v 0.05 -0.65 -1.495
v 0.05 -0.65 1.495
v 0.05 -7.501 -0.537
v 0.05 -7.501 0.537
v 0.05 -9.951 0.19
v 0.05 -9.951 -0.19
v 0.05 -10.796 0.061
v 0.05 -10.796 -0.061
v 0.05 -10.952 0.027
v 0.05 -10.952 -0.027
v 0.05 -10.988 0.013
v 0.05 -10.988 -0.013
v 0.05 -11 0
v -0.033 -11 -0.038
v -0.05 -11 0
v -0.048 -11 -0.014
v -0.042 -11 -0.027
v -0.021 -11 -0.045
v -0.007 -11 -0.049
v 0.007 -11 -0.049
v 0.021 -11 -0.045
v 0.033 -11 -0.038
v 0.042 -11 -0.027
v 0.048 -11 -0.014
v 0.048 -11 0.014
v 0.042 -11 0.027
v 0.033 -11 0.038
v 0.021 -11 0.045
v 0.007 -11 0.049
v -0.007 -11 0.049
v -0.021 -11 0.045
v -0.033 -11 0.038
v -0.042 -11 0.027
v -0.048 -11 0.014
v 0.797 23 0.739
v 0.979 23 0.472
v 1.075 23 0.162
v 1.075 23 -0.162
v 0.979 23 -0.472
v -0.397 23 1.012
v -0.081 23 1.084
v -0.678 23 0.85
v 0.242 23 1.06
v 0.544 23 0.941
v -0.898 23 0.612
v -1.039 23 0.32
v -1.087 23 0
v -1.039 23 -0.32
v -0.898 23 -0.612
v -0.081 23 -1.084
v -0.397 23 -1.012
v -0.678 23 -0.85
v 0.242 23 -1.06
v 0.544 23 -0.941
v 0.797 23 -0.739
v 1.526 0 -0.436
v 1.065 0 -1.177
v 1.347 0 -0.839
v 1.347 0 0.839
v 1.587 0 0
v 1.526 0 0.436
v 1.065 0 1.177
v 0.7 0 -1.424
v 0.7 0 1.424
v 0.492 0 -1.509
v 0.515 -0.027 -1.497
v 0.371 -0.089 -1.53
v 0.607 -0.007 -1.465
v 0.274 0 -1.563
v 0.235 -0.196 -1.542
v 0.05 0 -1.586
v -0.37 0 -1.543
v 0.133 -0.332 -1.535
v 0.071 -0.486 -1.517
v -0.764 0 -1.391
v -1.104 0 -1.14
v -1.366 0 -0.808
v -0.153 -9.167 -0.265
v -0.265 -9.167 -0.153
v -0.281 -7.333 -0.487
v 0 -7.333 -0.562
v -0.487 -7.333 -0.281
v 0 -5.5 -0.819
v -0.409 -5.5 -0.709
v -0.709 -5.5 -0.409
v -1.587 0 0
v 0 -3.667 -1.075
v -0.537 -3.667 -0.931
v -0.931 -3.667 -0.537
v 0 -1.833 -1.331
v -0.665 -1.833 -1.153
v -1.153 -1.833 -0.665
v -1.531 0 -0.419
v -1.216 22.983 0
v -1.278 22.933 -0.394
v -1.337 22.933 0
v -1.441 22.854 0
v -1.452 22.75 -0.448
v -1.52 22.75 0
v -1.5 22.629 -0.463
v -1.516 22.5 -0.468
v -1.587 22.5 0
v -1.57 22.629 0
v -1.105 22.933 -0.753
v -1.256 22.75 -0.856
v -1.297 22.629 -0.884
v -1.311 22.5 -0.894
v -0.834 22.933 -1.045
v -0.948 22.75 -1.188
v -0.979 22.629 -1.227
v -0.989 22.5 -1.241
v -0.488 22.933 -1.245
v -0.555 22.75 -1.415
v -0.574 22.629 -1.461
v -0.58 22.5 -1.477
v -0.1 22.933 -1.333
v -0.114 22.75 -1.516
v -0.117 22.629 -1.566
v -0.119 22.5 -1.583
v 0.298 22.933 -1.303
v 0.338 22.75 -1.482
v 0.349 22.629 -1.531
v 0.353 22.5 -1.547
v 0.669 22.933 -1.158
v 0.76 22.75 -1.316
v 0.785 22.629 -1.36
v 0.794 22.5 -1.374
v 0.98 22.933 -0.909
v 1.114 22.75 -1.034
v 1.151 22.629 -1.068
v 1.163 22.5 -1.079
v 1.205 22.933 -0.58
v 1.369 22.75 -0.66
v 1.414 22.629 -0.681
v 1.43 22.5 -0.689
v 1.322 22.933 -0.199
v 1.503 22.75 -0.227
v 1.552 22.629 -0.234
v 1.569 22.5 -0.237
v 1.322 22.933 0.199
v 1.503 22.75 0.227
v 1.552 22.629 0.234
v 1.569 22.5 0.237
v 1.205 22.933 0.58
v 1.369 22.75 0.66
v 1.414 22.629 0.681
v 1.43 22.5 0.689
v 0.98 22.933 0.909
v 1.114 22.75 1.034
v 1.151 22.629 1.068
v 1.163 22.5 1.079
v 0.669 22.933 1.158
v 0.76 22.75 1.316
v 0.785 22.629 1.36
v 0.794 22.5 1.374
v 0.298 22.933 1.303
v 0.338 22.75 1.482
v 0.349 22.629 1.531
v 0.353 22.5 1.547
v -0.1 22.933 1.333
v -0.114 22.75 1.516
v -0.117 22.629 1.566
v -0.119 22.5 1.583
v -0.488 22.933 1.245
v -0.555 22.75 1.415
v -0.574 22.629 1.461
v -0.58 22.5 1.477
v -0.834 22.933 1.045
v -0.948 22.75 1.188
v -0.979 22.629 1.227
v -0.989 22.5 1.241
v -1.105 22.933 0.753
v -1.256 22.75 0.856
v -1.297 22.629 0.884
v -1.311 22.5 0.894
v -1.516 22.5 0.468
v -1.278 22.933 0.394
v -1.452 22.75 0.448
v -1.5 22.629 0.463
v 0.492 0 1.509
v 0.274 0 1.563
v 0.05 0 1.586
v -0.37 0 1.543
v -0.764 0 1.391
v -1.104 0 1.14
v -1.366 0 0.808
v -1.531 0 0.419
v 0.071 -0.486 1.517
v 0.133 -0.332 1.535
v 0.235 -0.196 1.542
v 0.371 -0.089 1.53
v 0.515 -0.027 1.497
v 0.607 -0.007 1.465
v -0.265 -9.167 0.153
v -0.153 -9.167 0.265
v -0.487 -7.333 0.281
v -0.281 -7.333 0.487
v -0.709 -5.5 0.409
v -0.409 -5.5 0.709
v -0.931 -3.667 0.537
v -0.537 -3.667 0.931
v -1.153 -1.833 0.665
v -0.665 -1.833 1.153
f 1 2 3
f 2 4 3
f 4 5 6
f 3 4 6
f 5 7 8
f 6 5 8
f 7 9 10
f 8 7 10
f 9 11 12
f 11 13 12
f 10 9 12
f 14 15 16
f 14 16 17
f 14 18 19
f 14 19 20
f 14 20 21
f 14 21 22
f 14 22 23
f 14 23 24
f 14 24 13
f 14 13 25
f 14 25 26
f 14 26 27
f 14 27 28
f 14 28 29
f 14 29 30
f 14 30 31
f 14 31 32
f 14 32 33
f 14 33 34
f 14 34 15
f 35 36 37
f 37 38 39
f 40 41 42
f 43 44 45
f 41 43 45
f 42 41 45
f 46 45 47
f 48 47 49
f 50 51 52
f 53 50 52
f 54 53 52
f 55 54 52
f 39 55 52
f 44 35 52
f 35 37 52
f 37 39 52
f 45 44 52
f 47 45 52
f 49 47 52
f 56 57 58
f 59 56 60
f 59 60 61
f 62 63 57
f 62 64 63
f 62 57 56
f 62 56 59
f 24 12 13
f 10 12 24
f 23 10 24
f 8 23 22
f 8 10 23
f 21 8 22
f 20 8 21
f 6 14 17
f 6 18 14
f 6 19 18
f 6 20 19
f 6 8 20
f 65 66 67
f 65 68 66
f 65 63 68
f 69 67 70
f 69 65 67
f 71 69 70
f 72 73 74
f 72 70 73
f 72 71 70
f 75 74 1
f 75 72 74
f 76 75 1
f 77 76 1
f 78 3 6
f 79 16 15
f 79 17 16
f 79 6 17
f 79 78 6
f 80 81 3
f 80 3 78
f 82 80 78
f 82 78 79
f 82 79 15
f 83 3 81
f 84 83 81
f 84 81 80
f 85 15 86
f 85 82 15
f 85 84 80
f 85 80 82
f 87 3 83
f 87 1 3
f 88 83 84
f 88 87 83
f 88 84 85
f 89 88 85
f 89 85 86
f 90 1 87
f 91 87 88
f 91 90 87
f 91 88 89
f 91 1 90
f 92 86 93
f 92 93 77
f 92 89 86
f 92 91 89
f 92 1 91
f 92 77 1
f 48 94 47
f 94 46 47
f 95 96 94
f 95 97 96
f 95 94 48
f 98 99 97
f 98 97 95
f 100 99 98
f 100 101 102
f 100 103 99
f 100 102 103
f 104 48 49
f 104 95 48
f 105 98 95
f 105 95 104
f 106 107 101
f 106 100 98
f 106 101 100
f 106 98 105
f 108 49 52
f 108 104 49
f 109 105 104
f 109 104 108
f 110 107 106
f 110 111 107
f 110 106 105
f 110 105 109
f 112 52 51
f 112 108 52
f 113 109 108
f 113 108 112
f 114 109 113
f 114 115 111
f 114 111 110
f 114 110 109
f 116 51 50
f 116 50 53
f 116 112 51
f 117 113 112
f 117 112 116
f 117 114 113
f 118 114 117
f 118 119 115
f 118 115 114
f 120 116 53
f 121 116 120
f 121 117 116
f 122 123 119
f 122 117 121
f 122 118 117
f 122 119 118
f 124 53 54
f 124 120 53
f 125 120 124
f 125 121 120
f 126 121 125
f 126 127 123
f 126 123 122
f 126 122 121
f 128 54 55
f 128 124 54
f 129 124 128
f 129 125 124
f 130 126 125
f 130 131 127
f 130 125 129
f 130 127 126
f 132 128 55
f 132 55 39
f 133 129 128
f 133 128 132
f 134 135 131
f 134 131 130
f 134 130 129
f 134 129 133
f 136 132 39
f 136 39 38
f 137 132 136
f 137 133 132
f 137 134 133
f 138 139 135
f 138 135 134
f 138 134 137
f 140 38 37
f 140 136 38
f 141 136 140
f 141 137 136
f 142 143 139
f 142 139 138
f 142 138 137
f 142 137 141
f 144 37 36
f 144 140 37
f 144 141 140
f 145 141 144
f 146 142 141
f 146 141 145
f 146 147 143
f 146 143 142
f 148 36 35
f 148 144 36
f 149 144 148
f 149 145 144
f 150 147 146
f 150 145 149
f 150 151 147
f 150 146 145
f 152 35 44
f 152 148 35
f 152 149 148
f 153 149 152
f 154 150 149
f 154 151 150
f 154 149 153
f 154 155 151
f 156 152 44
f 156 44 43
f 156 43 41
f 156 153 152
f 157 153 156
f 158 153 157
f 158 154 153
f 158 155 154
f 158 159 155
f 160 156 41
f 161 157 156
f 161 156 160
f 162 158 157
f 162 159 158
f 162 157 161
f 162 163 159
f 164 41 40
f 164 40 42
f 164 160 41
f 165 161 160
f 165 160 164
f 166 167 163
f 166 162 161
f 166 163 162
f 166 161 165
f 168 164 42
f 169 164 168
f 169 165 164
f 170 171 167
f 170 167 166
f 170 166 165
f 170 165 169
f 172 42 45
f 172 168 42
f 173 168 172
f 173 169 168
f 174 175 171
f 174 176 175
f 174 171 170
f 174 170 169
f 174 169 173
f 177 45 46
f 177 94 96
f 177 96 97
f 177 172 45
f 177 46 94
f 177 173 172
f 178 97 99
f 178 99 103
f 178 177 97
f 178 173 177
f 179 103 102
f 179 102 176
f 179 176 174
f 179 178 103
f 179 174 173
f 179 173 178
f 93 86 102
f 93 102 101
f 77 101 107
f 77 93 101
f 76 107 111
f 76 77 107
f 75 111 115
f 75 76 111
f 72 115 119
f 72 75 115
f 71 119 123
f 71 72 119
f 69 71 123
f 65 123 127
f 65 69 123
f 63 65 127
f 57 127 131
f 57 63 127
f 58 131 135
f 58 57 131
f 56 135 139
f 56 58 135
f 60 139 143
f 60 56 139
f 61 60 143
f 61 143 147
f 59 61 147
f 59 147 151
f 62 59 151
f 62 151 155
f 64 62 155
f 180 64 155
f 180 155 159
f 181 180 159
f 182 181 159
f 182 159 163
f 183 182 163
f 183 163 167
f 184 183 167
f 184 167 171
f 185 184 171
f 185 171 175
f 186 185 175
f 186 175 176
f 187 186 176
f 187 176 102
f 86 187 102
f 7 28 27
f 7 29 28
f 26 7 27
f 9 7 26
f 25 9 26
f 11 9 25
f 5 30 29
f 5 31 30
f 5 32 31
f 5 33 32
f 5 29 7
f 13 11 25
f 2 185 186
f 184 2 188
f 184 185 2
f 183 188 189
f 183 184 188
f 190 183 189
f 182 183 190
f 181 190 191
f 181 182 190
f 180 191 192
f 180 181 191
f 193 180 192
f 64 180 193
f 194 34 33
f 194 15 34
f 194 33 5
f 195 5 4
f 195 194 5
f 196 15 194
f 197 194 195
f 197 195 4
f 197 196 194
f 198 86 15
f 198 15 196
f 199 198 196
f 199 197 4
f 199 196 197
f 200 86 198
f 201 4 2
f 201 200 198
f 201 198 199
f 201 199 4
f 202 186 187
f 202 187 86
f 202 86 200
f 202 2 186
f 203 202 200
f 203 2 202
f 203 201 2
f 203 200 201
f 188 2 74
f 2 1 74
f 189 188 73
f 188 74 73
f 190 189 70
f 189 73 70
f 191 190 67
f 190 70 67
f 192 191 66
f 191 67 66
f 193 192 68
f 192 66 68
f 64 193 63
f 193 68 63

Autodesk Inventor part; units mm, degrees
ref_plane "YZ Plane" through (0, 0, 0) normal (1, 0, 0) x (0, 1, 0)
ref_plane "XZ Plane" through (0, 0, 0) normal (0, 1, 0) x (-1, 0, 0)
ref_plane "XY Plane" through (0, 0, 0) normal (0, 0, 1) x (1, 0, 0)
sketch "Sketch1" plane through (0, 0, 0) normal (0, 0, 1) x (1, 0, 0)
  line L0 (0, 23) -> (-1.087, 23)
  line L1 (-1.587, 22.5) -> (-1.587, 0)
  line L2 (0, 23) -> (0, -11)
  line L3 (0, -11) -> (0, -10.95)
  line L4 (0, -11) -> (-0.05, -11)
  line L5 (-0.05, -11) -> (-1.587, 0)
  arc A0 (-1.087, 23) -> (-1.587, 22.5) centre (-1.087, 22.5) ccw
  point P0 (-1.587, 23)
  dimension "d1" = 1.587
  dimension "d8" = 0.05
  dimension "d13" = 0.5
revolve "Revolution1" add sketch "Sketch1" angle 360 about axis through (0, 23, 0) along (0, -1, 0)
sketch "Sketch2" plane through (0, -11, 0) normal (0, -1, 0) x (1, 0, 0)
  line L0 (0.05, 1.7032) -> (0.05, -1.887)
  line L1 (0.05, -1.887) -> (1.6041, -1.887)
  line L2 (1.6041, -1.887) -> (1.6041, 1.7032)
  line L3 (1.6041, 1.7032) -> (0.05, 1.7032)
  point P0 (0, 0)
  dimension "d10" = 0.05
extrude "Extrusion1" cut sketch "Sketch2" against normal blind 11
fillet "Fillet1" radius 0.65 1 edges at (0.05, 0, 0)
properties part number "Herramienta Punta de Lanza"
